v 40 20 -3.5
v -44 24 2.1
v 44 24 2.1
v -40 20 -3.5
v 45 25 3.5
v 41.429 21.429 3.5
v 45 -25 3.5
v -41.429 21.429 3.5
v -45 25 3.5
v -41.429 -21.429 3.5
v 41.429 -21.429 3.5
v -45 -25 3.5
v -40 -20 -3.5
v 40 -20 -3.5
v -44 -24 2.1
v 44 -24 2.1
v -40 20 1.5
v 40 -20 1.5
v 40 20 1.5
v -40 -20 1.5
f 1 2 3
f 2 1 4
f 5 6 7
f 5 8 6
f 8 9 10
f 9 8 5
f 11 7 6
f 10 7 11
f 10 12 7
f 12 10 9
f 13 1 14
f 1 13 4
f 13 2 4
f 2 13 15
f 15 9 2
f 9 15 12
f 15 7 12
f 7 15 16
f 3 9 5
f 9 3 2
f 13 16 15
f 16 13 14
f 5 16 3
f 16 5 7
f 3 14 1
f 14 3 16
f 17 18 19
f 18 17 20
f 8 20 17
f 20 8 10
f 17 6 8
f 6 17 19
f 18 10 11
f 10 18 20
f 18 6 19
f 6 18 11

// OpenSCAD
SHELF_THICKNESS = 5;
SHELF_HEIGHT = SHELF_THICKNESS + 2;


SHELF_BOTTOM_DEPTH = 40;
SHELF_TOP_DEPTH = SHELF_BOTTOM_DEPTH + 10;

SHELF_BOTTOM_WIDTH = 80;
SHELF_TOP_WIDTH = SHELF_BOTTOM_WIDTH + 10;


function is_vector(thing) = (
    thing[0] == thing[0] && len(thing) != undef
);

function to_coord(thing) = (
    is_vector(thing) ? thing : [thing, thing]
);


module wedge(height, width, depth) {
    _width = to_coord(width);
    _depth =  to_coord(depth);

    bottom_width = _width[0];
    top_width = _width[1];
    
    bottom_depth = _depth[0];
    top_depth = _depth[1];

    s_w = (top_width / bottom_width);
    s_d = (top_depth / bottom_depth);

    linear_extrude(height = height, center = true, scale=[s_w, s_d]) {
        square(size = [bottom_width, bottom_depth], center = true);
    }
}



module shelf(height, width, depth, t) {
    difference() {
        wedge(height = height, width = width, depth = depth);
        
        translate([0, 0, t]) {
            wedge(height = height, width = width, depth = depth);
        }
    }
}



shelf(
    height = SHELF_HEIGHT,
    width = [SHELF_BOTTOM_WIDTH, SHELF_TOP_WIDTH],
    depth = [SHELF_BOTTOM_DEPTH, SHELF_TOP_DEPTH],
    t = SHELF_THICKNESS
);
